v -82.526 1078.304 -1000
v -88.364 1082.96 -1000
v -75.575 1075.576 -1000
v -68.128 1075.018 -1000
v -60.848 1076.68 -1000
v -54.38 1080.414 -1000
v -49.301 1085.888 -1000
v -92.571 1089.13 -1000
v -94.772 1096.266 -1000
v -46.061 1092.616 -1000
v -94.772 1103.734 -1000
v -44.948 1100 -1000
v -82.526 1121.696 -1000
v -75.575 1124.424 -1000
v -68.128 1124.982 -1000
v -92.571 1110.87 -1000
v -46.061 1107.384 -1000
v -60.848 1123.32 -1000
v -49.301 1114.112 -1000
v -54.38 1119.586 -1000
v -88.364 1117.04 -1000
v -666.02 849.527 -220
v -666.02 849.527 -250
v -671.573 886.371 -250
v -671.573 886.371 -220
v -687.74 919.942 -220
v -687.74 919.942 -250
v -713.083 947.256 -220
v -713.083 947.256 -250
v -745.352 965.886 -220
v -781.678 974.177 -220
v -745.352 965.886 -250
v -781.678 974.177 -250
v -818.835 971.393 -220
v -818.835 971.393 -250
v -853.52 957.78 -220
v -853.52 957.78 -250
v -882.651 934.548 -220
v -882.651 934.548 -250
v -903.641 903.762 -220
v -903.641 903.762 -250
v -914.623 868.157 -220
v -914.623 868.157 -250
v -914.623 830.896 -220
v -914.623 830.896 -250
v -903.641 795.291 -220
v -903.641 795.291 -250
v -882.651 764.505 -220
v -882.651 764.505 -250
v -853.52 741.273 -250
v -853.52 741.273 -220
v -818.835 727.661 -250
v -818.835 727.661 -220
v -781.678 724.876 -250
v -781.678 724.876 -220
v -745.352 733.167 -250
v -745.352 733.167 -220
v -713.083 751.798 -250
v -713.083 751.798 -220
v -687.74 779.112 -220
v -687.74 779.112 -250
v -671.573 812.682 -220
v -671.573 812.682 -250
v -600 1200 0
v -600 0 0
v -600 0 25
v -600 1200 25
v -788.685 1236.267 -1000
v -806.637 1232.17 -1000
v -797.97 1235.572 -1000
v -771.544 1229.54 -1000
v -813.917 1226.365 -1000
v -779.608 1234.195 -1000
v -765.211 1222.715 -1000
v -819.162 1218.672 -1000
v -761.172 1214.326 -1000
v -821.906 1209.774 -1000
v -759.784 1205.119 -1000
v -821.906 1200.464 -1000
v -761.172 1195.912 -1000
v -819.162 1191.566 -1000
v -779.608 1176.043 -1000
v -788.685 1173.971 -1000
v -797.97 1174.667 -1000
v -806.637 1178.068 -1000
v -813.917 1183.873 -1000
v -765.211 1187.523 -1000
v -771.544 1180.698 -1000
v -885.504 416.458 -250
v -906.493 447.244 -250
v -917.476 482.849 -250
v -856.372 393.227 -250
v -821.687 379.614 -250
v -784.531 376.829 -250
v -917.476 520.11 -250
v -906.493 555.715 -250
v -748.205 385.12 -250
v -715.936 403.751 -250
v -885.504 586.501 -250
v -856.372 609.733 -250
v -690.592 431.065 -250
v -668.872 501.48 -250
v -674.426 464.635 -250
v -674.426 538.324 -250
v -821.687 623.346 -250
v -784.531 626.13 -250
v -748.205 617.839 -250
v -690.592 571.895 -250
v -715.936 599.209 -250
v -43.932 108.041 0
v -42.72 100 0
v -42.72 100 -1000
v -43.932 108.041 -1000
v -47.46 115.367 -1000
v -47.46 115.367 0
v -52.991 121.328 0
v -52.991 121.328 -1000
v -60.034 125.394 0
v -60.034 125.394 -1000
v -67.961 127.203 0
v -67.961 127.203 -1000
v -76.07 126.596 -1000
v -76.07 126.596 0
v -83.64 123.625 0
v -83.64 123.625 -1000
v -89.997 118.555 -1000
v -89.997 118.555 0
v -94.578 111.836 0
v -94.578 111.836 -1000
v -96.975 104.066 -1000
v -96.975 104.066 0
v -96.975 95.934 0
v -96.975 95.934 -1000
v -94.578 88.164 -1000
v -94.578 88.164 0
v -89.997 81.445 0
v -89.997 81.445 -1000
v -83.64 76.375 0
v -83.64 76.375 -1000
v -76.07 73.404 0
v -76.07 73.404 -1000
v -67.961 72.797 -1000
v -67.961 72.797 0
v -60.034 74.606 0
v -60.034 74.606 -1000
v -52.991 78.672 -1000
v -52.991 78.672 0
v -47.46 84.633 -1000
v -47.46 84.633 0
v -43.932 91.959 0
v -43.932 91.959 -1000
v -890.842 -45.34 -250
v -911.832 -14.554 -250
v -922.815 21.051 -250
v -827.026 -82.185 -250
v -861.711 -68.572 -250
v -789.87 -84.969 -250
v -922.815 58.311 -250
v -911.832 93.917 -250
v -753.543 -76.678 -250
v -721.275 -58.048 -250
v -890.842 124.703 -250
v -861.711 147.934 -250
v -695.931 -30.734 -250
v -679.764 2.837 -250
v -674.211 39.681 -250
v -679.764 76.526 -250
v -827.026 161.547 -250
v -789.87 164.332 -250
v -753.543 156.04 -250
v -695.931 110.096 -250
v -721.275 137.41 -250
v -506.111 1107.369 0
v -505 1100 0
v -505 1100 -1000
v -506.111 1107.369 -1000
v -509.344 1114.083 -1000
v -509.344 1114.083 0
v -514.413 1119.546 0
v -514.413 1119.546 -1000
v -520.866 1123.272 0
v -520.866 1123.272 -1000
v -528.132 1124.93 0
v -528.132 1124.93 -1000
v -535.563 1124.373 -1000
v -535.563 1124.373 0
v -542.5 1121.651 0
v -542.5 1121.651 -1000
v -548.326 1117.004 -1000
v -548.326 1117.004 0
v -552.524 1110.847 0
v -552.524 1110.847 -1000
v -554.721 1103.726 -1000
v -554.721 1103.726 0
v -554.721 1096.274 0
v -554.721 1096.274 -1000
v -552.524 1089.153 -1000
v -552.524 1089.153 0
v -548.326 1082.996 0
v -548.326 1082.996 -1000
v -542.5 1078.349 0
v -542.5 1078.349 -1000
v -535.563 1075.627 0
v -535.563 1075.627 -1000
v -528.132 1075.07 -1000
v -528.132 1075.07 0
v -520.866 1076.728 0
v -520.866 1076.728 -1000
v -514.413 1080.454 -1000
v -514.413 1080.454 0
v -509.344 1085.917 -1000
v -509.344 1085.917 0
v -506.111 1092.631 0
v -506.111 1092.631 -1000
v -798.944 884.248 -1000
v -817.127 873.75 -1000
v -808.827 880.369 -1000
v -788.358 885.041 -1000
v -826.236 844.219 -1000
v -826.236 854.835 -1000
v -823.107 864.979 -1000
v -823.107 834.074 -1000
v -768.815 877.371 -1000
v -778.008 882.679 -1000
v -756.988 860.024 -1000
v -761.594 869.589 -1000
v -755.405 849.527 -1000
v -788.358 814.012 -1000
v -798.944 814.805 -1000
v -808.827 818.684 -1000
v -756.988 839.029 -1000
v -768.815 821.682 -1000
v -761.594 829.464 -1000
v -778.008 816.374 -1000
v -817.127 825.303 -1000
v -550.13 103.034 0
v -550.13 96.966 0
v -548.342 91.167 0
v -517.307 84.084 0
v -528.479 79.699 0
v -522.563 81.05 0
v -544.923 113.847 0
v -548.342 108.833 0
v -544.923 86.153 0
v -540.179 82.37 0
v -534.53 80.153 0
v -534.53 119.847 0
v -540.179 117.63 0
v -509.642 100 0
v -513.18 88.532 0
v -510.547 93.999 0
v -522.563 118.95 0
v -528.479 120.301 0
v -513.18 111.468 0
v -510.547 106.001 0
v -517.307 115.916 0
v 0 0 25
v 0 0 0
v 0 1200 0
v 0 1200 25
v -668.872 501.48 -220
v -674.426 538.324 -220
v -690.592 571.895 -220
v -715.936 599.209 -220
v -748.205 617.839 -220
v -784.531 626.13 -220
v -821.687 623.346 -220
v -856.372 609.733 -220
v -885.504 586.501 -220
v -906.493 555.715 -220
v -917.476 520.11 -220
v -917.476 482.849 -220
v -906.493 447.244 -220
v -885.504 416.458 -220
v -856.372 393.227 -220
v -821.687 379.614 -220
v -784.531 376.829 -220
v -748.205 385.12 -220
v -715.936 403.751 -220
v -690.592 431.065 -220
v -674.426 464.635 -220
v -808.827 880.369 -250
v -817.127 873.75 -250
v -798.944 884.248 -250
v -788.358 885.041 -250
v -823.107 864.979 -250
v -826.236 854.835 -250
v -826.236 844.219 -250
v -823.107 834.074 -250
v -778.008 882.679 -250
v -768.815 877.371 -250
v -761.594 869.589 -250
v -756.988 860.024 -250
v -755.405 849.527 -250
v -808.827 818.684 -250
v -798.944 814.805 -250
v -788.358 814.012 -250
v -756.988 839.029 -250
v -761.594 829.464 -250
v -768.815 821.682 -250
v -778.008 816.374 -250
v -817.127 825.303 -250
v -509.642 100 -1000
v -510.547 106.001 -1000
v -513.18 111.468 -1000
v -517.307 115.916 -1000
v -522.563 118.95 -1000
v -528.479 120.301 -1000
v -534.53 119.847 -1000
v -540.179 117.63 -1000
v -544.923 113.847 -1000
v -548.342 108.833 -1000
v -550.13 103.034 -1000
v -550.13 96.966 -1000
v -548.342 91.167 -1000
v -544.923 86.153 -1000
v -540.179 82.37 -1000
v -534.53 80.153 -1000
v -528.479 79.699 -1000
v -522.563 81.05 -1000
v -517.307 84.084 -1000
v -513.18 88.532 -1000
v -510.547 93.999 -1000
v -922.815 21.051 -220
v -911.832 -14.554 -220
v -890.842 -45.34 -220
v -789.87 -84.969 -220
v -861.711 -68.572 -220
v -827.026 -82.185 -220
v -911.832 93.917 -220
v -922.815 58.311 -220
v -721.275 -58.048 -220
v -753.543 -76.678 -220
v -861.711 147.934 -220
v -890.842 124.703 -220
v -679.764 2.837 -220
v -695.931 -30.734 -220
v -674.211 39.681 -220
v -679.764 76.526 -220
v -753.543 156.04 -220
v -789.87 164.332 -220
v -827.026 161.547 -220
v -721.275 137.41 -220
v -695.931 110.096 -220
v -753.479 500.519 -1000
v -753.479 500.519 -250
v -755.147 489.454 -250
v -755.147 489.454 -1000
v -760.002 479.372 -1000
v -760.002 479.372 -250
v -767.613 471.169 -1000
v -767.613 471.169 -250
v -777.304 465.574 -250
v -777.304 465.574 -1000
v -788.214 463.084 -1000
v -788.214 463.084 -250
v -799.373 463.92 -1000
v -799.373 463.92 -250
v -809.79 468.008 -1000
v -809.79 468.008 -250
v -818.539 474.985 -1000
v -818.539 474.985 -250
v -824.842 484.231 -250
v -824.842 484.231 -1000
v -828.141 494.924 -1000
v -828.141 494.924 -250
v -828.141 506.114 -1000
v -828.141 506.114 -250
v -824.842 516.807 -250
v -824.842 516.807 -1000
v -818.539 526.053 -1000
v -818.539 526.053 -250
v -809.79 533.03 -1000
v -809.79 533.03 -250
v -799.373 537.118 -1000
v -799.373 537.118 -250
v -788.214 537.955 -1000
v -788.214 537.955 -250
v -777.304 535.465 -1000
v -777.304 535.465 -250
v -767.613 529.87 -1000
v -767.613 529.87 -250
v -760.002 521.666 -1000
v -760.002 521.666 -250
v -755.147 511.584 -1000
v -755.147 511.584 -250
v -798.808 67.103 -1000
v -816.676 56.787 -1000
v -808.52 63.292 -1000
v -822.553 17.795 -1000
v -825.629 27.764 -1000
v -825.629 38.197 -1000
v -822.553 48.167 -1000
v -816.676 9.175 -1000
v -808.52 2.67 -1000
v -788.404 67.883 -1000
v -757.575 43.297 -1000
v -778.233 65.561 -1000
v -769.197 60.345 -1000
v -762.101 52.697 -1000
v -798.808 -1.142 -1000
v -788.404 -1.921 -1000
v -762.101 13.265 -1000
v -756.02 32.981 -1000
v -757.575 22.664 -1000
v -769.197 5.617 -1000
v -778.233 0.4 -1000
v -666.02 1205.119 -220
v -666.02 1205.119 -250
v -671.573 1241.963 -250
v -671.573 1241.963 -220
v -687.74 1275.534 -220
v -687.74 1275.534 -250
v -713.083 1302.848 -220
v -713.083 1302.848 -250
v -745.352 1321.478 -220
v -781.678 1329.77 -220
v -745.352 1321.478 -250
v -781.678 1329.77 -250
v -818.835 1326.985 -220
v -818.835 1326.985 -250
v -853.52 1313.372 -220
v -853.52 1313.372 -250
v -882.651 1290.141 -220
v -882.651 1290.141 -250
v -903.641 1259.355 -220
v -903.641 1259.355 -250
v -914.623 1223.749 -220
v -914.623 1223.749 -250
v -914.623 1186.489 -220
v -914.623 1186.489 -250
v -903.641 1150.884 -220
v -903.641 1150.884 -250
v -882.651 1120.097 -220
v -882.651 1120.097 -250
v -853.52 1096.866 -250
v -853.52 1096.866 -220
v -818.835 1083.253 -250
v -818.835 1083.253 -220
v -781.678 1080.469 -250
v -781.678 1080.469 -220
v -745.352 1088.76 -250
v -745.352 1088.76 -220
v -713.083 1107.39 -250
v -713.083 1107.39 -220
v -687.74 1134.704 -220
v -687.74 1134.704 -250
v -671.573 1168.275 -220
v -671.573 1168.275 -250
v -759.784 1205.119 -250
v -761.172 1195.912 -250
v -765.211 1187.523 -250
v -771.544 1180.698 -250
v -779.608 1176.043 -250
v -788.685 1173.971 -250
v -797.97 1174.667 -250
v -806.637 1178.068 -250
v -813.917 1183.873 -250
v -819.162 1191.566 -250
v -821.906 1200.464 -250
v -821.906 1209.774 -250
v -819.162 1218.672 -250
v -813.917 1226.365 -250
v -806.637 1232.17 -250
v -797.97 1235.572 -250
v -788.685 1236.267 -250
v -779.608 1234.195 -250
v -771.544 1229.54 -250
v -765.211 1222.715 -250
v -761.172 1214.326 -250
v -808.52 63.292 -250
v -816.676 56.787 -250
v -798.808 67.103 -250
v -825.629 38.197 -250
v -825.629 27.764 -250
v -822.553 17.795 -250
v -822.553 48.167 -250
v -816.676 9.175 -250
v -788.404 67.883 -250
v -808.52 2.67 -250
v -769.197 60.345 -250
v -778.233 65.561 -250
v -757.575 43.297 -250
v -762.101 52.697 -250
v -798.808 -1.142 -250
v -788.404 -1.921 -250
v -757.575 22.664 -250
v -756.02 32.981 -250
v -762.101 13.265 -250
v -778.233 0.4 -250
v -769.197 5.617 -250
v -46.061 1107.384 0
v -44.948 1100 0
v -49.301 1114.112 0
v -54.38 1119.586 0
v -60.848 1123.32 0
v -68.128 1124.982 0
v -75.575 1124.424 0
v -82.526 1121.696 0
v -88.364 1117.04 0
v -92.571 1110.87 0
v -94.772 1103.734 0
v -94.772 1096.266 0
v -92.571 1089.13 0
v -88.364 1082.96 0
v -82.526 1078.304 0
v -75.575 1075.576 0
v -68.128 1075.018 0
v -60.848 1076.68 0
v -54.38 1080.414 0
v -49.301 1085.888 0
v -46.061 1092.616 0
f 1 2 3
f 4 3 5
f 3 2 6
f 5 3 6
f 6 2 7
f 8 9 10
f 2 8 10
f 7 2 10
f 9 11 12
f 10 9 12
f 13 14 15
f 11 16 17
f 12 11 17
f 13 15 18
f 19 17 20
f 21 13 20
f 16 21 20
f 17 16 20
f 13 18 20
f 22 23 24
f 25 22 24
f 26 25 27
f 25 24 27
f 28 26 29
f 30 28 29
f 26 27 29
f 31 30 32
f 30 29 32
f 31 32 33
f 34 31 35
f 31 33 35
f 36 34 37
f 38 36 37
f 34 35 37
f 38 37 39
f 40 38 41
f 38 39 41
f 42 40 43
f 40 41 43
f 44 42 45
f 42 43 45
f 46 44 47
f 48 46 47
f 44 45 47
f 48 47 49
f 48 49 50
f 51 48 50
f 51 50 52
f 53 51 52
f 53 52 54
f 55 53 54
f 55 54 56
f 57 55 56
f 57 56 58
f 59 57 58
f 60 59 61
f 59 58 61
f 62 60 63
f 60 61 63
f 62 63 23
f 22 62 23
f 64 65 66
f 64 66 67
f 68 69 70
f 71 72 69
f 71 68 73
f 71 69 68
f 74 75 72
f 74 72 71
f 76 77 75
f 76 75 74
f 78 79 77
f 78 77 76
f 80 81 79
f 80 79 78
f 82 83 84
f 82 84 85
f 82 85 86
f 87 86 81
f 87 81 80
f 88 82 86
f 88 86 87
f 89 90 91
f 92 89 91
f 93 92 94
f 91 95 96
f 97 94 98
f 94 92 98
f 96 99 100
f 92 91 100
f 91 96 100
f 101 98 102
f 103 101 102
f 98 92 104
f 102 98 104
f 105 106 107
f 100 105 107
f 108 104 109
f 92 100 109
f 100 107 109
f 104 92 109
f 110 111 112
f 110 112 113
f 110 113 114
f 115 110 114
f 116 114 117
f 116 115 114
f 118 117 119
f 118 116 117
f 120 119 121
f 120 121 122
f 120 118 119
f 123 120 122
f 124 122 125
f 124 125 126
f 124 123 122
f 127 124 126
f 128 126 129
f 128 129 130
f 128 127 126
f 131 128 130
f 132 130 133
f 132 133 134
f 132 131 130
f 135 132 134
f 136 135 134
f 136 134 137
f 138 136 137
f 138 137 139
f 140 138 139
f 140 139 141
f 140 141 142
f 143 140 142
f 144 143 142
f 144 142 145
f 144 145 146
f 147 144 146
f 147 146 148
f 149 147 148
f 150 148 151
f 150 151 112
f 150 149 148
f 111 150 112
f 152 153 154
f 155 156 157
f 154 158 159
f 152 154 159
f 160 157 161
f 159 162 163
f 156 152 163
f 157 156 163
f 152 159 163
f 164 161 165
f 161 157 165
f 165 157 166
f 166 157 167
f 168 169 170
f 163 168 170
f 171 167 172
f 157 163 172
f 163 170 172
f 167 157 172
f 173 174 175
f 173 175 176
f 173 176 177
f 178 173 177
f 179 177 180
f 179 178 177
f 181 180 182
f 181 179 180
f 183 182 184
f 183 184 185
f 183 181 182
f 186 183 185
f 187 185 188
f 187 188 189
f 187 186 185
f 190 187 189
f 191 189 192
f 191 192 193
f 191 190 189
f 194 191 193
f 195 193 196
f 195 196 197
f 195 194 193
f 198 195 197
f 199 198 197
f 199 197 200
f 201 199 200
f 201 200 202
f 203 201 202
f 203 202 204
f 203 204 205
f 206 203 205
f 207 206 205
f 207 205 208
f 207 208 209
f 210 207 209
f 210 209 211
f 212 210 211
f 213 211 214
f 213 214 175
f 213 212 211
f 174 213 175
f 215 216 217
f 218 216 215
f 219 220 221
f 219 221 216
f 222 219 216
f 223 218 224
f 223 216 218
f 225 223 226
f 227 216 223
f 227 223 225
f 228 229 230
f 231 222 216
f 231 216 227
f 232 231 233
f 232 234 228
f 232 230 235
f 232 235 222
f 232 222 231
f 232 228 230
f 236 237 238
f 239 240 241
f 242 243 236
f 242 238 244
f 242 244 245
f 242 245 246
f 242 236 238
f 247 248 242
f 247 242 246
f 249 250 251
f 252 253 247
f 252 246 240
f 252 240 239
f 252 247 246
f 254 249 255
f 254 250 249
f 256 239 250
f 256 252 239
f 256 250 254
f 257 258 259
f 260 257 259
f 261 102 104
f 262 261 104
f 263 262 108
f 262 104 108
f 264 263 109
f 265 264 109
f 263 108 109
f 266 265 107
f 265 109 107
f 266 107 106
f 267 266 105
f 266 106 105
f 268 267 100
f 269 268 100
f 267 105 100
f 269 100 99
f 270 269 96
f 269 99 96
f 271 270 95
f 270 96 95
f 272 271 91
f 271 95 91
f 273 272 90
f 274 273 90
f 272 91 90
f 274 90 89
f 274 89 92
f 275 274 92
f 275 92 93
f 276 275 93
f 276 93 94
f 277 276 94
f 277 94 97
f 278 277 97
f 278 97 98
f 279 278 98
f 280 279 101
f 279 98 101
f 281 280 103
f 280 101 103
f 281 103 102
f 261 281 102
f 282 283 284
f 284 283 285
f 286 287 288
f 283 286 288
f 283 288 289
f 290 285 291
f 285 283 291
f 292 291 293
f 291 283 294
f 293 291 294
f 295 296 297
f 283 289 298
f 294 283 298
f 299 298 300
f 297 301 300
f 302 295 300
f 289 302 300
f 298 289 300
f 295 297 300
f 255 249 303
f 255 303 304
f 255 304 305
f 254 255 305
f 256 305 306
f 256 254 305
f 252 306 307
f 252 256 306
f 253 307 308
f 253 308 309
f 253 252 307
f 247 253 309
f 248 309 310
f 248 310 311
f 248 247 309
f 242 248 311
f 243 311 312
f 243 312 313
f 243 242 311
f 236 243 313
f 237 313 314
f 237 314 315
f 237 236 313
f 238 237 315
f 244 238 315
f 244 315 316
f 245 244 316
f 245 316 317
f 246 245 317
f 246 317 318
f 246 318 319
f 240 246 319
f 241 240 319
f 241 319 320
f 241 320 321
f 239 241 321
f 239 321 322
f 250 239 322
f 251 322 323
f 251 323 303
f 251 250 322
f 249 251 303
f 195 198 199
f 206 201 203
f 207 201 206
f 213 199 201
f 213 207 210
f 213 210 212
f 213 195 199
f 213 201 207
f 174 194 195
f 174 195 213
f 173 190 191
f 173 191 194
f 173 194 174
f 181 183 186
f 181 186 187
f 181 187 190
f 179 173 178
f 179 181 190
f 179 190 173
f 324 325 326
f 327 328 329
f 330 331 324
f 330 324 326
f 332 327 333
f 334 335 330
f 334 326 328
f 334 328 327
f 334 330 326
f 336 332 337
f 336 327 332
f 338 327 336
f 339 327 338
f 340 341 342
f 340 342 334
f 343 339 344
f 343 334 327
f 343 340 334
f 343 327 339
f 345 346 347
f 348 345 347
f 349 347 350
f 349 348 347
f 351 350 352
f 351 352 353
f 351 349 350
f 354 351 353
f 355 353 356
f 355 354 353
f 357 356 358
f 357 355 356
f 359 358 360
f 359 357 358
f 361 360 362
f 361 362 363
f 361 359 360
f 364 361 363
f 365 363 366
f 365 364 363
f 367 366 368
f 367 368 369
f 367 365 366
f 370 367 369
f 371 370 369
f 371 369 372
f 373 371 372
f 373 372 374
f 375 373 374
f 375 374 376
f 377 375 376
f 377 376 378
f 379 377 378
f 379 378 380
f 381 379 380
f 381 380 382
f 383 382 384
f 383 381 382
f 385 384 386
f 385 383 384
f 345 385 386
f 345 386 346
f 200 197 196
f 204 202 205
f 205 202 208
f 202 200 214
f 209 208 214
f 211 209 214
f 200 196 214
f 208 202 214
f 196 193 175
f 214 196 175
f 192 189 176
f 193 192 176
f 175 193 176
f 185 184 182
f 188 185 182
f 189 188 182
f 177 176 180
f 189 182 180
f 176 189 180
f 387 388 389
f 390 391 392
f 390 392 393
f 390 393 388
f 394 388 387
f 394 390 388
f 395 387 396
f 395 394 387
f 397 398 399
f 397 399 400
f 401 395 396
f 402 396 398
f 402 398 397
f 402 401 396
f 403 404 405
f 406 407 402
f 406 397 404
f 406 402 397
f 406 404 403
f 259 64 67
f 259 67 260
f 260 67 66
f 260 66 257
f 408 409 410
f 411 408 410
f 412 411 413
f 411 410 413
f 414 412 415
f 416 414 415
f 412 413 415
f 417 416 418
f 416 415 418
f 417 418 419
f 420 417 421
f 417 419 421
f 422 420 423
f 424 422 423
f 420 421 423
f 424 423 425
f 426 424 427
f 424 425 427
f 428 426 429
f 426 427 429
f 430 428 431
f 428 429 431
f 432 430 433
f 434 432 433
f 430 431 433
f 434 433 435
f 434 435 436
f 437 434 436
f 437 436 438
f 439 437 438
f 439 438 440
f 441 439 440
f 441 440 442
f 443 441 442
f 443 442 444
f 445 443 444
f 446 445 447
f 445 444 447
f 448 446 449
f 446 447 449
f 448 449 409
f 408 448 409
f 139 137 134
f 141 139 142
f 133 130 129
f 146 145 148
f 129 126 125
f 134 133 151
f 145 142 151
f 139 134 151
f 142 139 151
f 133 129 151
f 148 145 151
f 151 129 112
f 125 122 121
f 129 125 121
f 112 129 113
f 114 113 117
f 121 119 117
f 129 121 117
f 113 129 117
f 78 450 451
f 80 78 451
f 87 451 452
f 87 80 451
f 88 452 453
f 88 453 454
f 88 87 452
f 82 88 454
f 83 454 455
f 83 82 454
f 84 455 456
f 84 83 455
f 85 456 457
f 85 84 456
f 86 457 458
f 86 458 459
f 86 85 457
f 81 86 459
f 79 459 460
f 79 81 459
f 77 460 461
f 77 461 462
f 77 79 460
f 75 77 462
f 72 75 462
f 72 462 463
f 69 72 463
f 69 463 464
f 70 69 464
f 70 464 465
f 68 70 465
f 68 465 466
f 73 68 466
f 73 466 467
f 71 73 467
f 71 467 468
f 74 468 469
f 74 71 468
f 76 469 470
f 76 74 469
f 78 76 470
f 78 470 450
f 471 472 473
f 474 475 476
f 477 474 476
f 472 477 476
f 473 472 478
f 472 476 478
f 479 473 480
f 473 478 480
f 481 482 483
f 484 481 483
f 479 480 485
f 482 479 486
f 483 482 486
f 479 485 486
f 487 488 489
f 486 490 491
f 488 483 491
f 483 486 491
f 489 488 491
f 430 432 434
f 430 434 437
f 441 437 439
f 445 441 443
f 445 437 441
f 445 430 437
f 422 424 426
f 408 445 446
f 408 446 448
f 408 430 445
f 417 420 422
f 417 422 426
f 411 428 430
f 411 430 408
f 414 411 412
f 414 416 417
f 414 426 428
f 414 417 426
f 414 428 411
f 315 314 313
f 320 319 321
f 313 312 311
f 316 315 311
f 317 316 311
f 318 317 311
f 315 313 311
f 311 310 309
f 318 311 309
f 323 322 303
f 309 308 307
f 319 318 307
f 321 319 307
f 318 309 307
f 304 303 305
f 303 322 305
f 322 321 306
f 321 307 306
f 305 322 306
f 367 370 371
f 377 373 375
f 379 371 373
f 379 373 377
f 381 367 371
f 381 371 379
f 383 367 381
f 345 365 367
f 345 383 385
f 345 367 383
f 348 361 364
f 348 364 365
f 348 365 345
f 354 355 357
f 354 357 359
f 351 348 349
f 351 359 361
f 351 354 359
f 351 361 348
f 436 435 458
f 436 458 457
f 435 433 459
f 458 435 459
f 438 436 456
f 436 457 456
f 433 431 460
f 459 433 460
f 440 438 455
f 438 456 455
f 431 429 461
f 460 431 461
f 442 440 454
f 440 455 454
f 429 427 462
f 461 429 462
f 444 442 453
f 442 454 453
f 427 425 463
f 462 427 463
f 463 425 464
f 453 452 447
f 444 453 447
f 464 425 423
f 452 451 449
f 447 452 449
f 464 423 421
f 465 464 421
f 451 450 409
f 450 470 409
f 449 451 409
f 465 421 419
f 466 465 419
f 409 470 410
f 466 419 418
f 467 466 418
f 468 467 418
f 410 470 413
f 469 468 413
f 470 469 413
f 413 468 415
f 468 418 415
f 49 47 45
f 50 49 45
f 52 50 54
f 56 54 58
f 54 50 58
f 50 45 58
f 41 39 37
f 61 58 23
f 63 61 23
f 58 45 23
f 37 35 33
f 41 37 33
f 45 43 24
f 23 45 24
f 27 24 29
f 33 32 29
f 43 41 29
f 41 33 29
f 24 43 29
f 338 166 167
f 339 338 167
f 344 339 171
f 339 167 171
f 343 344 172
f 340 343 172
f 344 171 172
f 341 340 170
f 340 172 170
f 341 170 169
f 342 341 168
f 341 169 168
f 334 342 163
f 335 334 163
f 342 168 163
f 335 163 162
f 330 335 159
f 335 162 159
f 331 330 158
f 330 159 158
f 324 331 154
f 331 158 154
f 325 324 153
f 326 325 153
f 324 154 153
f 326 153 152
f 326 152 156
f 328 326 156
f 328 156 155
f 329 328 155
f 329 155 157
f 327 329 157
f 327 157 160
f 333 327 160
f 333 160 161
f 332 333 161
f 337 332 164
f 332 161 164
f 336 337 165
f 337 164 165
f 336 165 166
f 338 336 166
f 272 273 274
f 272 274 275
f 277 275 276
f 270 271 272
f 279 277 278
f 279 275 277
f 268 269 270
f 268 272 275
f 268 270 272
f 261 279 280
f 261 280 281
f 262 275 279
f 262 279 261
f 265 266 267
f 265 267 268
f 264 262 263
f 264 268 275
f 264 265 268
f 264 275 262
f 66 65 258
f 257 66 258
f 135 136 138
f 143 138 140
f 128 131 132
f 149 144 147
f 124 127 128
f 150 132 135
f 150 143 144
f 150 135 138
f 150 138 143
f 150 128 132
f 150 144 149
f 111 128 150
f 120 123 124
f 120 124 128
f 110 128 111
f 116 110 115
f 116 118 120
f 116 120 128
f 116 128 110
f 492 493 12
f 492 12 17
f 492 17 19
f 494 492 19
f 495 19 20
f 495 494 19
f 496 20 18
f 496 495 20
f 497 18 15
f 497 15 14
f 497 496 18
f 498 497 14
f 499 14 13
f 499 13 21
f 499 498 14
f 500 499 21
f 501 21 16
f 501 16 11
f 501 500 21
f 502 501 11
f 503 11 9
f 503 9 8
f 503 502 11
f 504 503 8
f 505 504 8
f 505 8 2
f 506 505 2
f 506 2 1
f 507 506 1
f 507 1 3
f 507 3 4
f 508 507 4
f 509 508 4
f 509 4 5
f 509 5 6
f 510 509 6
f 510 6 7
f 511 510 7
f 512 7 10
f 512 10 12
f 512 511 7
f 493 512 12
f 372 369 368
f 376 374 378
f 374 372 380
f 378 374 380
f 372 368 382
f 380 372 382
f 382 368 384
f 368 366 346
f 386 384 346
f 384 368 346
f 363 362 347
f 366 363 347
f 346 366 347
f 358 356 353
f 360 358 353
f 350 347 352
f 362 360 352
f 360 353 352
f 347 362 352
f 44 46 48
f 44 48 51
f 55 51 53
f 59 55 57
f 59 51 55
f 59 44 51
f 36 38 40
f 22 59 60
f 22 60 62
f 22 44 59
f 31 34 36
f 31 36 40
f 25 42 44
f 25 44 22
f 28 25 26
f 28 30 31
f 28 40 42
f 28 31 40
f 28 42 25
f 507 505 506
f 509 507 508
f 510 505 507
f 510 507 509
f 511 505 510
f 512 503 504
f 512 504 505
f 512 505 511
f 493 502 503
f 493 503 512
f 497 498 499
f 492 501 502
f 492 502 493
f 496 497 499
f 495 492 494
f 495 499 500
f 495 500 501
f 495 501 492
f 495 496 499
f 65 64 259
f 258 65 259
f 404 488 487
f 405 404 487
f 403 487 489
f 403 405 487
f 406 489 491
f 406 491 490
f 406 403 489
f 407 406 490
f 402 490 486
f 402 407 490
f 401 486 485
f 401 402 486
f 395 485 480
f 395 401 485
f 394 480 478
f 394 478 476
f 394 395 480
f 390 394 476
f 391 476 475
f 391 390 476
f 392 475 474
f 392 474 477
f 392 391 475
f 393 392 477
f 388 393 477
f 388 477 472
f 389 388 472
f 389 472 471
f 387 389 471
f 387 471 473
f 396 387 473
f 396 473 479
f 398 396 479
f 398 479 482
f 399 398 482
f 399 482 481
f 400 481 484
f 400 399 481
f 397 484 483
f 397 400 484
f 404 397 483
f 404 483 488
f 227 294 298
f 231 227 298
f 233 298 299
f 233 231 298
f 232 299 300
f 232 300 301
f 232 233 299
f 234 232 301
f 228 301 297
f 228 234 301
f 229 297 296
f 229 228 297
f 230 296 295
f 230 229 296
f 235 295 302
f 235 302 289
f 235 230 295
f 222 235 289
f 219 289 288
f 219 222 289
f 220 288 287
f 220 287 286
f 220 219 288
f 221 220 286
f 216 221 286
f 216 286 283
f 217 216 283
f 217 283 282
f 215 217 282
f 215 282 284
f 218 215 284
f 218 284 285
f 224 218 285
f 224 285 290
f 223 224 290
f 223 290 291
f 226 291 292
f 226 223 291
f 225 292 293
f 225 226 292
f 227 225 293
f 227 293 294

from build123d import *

# Parameters (mm, degrees)
F1_R     = 25
F1_R_2   = 25.051824
F1_R_3   = 27.279717
F1_R_4   = 20.357676
F2_DEPTH = 1000
F0_W     = 600
F0_H     = 1200
F3_DEPTH = 25
F4_R     = 35
F4_R_2   = 37.540582
F4_R_3   = 35.614116
F4_R_4   = 31.235629
F5_DEPTH = 750
F6_R     = 125
F7_DEPTH = 30
F8_R     = 125
F9_DEPTH = 30


with BuildPart() as f2:
    # F1 (on face) → F2 (new body)
    with BuildSketch(Plane.XY):
        with Locations((-530, 1100)):
            Circle(F1_R)
        with Locations((-70, 1100)):
            Circle(F1_R_2)
        with Locations((-70, 100)):
            Circle(F1_R_3)
        with Locations((-530, 100)):
            Circle(F1_R_4)
    extrude(amount=-F2_DEPTH)


with BuildPart() as f3:
    # F0 (on Top) → F3 (new body)
    with BuildSketch(Plane.XY):
        with Locations((-300, 600)):
            Rectangle(F0_W, F0_H)
    extrude(amount=F3_DEPTH)


with BuildPart() as f5:
    # F4 (on face) → F5 (new body)
    with BuildSketch(Plane(origin=(0, 0, -1000), x_dir=(1, 0, 0), z_dir=(0, 0, -1))):
        with Locations((-791.019559, -32.980834)):
            Circle(F4_R)
        with Locations((-791.019559, -500.519117)):
            Circle(F4_R_2)
        with Locations((-791.019559, -849.526593)):
            Circle(F4_R_3)
        with Locations((-791.019559, -1205.119055)):
            Circle(F4_R_4)
    extrude(amount=-F5_DEPTH)

    # F6 (on face) → F7 (join)
    with BuildSketch(Plane.XY.offset(-250)):
        with Locations((-791.019559, 1205.119055)):
            Circle(F6_R)
    extrude(amount=F7_DEPTH)


with BuildPart() as f9:
    # F8 (on face) → F9 (new body)
    with BuildSketch(Plane.XY.offset(-250)):
        with Locations((-791.019559, 849.526593)):
            Circle(F8_R)
        with Locations((-793.872204, 501.4797)):
            Circle(F8_R)
        with Locations((-799.210943, 39.681176)):
            Circle(F8_R)
    extrude(amount=F9_DEPTH)


solid = Compound([f2.part, f3.part, f5.part, f9.part])
